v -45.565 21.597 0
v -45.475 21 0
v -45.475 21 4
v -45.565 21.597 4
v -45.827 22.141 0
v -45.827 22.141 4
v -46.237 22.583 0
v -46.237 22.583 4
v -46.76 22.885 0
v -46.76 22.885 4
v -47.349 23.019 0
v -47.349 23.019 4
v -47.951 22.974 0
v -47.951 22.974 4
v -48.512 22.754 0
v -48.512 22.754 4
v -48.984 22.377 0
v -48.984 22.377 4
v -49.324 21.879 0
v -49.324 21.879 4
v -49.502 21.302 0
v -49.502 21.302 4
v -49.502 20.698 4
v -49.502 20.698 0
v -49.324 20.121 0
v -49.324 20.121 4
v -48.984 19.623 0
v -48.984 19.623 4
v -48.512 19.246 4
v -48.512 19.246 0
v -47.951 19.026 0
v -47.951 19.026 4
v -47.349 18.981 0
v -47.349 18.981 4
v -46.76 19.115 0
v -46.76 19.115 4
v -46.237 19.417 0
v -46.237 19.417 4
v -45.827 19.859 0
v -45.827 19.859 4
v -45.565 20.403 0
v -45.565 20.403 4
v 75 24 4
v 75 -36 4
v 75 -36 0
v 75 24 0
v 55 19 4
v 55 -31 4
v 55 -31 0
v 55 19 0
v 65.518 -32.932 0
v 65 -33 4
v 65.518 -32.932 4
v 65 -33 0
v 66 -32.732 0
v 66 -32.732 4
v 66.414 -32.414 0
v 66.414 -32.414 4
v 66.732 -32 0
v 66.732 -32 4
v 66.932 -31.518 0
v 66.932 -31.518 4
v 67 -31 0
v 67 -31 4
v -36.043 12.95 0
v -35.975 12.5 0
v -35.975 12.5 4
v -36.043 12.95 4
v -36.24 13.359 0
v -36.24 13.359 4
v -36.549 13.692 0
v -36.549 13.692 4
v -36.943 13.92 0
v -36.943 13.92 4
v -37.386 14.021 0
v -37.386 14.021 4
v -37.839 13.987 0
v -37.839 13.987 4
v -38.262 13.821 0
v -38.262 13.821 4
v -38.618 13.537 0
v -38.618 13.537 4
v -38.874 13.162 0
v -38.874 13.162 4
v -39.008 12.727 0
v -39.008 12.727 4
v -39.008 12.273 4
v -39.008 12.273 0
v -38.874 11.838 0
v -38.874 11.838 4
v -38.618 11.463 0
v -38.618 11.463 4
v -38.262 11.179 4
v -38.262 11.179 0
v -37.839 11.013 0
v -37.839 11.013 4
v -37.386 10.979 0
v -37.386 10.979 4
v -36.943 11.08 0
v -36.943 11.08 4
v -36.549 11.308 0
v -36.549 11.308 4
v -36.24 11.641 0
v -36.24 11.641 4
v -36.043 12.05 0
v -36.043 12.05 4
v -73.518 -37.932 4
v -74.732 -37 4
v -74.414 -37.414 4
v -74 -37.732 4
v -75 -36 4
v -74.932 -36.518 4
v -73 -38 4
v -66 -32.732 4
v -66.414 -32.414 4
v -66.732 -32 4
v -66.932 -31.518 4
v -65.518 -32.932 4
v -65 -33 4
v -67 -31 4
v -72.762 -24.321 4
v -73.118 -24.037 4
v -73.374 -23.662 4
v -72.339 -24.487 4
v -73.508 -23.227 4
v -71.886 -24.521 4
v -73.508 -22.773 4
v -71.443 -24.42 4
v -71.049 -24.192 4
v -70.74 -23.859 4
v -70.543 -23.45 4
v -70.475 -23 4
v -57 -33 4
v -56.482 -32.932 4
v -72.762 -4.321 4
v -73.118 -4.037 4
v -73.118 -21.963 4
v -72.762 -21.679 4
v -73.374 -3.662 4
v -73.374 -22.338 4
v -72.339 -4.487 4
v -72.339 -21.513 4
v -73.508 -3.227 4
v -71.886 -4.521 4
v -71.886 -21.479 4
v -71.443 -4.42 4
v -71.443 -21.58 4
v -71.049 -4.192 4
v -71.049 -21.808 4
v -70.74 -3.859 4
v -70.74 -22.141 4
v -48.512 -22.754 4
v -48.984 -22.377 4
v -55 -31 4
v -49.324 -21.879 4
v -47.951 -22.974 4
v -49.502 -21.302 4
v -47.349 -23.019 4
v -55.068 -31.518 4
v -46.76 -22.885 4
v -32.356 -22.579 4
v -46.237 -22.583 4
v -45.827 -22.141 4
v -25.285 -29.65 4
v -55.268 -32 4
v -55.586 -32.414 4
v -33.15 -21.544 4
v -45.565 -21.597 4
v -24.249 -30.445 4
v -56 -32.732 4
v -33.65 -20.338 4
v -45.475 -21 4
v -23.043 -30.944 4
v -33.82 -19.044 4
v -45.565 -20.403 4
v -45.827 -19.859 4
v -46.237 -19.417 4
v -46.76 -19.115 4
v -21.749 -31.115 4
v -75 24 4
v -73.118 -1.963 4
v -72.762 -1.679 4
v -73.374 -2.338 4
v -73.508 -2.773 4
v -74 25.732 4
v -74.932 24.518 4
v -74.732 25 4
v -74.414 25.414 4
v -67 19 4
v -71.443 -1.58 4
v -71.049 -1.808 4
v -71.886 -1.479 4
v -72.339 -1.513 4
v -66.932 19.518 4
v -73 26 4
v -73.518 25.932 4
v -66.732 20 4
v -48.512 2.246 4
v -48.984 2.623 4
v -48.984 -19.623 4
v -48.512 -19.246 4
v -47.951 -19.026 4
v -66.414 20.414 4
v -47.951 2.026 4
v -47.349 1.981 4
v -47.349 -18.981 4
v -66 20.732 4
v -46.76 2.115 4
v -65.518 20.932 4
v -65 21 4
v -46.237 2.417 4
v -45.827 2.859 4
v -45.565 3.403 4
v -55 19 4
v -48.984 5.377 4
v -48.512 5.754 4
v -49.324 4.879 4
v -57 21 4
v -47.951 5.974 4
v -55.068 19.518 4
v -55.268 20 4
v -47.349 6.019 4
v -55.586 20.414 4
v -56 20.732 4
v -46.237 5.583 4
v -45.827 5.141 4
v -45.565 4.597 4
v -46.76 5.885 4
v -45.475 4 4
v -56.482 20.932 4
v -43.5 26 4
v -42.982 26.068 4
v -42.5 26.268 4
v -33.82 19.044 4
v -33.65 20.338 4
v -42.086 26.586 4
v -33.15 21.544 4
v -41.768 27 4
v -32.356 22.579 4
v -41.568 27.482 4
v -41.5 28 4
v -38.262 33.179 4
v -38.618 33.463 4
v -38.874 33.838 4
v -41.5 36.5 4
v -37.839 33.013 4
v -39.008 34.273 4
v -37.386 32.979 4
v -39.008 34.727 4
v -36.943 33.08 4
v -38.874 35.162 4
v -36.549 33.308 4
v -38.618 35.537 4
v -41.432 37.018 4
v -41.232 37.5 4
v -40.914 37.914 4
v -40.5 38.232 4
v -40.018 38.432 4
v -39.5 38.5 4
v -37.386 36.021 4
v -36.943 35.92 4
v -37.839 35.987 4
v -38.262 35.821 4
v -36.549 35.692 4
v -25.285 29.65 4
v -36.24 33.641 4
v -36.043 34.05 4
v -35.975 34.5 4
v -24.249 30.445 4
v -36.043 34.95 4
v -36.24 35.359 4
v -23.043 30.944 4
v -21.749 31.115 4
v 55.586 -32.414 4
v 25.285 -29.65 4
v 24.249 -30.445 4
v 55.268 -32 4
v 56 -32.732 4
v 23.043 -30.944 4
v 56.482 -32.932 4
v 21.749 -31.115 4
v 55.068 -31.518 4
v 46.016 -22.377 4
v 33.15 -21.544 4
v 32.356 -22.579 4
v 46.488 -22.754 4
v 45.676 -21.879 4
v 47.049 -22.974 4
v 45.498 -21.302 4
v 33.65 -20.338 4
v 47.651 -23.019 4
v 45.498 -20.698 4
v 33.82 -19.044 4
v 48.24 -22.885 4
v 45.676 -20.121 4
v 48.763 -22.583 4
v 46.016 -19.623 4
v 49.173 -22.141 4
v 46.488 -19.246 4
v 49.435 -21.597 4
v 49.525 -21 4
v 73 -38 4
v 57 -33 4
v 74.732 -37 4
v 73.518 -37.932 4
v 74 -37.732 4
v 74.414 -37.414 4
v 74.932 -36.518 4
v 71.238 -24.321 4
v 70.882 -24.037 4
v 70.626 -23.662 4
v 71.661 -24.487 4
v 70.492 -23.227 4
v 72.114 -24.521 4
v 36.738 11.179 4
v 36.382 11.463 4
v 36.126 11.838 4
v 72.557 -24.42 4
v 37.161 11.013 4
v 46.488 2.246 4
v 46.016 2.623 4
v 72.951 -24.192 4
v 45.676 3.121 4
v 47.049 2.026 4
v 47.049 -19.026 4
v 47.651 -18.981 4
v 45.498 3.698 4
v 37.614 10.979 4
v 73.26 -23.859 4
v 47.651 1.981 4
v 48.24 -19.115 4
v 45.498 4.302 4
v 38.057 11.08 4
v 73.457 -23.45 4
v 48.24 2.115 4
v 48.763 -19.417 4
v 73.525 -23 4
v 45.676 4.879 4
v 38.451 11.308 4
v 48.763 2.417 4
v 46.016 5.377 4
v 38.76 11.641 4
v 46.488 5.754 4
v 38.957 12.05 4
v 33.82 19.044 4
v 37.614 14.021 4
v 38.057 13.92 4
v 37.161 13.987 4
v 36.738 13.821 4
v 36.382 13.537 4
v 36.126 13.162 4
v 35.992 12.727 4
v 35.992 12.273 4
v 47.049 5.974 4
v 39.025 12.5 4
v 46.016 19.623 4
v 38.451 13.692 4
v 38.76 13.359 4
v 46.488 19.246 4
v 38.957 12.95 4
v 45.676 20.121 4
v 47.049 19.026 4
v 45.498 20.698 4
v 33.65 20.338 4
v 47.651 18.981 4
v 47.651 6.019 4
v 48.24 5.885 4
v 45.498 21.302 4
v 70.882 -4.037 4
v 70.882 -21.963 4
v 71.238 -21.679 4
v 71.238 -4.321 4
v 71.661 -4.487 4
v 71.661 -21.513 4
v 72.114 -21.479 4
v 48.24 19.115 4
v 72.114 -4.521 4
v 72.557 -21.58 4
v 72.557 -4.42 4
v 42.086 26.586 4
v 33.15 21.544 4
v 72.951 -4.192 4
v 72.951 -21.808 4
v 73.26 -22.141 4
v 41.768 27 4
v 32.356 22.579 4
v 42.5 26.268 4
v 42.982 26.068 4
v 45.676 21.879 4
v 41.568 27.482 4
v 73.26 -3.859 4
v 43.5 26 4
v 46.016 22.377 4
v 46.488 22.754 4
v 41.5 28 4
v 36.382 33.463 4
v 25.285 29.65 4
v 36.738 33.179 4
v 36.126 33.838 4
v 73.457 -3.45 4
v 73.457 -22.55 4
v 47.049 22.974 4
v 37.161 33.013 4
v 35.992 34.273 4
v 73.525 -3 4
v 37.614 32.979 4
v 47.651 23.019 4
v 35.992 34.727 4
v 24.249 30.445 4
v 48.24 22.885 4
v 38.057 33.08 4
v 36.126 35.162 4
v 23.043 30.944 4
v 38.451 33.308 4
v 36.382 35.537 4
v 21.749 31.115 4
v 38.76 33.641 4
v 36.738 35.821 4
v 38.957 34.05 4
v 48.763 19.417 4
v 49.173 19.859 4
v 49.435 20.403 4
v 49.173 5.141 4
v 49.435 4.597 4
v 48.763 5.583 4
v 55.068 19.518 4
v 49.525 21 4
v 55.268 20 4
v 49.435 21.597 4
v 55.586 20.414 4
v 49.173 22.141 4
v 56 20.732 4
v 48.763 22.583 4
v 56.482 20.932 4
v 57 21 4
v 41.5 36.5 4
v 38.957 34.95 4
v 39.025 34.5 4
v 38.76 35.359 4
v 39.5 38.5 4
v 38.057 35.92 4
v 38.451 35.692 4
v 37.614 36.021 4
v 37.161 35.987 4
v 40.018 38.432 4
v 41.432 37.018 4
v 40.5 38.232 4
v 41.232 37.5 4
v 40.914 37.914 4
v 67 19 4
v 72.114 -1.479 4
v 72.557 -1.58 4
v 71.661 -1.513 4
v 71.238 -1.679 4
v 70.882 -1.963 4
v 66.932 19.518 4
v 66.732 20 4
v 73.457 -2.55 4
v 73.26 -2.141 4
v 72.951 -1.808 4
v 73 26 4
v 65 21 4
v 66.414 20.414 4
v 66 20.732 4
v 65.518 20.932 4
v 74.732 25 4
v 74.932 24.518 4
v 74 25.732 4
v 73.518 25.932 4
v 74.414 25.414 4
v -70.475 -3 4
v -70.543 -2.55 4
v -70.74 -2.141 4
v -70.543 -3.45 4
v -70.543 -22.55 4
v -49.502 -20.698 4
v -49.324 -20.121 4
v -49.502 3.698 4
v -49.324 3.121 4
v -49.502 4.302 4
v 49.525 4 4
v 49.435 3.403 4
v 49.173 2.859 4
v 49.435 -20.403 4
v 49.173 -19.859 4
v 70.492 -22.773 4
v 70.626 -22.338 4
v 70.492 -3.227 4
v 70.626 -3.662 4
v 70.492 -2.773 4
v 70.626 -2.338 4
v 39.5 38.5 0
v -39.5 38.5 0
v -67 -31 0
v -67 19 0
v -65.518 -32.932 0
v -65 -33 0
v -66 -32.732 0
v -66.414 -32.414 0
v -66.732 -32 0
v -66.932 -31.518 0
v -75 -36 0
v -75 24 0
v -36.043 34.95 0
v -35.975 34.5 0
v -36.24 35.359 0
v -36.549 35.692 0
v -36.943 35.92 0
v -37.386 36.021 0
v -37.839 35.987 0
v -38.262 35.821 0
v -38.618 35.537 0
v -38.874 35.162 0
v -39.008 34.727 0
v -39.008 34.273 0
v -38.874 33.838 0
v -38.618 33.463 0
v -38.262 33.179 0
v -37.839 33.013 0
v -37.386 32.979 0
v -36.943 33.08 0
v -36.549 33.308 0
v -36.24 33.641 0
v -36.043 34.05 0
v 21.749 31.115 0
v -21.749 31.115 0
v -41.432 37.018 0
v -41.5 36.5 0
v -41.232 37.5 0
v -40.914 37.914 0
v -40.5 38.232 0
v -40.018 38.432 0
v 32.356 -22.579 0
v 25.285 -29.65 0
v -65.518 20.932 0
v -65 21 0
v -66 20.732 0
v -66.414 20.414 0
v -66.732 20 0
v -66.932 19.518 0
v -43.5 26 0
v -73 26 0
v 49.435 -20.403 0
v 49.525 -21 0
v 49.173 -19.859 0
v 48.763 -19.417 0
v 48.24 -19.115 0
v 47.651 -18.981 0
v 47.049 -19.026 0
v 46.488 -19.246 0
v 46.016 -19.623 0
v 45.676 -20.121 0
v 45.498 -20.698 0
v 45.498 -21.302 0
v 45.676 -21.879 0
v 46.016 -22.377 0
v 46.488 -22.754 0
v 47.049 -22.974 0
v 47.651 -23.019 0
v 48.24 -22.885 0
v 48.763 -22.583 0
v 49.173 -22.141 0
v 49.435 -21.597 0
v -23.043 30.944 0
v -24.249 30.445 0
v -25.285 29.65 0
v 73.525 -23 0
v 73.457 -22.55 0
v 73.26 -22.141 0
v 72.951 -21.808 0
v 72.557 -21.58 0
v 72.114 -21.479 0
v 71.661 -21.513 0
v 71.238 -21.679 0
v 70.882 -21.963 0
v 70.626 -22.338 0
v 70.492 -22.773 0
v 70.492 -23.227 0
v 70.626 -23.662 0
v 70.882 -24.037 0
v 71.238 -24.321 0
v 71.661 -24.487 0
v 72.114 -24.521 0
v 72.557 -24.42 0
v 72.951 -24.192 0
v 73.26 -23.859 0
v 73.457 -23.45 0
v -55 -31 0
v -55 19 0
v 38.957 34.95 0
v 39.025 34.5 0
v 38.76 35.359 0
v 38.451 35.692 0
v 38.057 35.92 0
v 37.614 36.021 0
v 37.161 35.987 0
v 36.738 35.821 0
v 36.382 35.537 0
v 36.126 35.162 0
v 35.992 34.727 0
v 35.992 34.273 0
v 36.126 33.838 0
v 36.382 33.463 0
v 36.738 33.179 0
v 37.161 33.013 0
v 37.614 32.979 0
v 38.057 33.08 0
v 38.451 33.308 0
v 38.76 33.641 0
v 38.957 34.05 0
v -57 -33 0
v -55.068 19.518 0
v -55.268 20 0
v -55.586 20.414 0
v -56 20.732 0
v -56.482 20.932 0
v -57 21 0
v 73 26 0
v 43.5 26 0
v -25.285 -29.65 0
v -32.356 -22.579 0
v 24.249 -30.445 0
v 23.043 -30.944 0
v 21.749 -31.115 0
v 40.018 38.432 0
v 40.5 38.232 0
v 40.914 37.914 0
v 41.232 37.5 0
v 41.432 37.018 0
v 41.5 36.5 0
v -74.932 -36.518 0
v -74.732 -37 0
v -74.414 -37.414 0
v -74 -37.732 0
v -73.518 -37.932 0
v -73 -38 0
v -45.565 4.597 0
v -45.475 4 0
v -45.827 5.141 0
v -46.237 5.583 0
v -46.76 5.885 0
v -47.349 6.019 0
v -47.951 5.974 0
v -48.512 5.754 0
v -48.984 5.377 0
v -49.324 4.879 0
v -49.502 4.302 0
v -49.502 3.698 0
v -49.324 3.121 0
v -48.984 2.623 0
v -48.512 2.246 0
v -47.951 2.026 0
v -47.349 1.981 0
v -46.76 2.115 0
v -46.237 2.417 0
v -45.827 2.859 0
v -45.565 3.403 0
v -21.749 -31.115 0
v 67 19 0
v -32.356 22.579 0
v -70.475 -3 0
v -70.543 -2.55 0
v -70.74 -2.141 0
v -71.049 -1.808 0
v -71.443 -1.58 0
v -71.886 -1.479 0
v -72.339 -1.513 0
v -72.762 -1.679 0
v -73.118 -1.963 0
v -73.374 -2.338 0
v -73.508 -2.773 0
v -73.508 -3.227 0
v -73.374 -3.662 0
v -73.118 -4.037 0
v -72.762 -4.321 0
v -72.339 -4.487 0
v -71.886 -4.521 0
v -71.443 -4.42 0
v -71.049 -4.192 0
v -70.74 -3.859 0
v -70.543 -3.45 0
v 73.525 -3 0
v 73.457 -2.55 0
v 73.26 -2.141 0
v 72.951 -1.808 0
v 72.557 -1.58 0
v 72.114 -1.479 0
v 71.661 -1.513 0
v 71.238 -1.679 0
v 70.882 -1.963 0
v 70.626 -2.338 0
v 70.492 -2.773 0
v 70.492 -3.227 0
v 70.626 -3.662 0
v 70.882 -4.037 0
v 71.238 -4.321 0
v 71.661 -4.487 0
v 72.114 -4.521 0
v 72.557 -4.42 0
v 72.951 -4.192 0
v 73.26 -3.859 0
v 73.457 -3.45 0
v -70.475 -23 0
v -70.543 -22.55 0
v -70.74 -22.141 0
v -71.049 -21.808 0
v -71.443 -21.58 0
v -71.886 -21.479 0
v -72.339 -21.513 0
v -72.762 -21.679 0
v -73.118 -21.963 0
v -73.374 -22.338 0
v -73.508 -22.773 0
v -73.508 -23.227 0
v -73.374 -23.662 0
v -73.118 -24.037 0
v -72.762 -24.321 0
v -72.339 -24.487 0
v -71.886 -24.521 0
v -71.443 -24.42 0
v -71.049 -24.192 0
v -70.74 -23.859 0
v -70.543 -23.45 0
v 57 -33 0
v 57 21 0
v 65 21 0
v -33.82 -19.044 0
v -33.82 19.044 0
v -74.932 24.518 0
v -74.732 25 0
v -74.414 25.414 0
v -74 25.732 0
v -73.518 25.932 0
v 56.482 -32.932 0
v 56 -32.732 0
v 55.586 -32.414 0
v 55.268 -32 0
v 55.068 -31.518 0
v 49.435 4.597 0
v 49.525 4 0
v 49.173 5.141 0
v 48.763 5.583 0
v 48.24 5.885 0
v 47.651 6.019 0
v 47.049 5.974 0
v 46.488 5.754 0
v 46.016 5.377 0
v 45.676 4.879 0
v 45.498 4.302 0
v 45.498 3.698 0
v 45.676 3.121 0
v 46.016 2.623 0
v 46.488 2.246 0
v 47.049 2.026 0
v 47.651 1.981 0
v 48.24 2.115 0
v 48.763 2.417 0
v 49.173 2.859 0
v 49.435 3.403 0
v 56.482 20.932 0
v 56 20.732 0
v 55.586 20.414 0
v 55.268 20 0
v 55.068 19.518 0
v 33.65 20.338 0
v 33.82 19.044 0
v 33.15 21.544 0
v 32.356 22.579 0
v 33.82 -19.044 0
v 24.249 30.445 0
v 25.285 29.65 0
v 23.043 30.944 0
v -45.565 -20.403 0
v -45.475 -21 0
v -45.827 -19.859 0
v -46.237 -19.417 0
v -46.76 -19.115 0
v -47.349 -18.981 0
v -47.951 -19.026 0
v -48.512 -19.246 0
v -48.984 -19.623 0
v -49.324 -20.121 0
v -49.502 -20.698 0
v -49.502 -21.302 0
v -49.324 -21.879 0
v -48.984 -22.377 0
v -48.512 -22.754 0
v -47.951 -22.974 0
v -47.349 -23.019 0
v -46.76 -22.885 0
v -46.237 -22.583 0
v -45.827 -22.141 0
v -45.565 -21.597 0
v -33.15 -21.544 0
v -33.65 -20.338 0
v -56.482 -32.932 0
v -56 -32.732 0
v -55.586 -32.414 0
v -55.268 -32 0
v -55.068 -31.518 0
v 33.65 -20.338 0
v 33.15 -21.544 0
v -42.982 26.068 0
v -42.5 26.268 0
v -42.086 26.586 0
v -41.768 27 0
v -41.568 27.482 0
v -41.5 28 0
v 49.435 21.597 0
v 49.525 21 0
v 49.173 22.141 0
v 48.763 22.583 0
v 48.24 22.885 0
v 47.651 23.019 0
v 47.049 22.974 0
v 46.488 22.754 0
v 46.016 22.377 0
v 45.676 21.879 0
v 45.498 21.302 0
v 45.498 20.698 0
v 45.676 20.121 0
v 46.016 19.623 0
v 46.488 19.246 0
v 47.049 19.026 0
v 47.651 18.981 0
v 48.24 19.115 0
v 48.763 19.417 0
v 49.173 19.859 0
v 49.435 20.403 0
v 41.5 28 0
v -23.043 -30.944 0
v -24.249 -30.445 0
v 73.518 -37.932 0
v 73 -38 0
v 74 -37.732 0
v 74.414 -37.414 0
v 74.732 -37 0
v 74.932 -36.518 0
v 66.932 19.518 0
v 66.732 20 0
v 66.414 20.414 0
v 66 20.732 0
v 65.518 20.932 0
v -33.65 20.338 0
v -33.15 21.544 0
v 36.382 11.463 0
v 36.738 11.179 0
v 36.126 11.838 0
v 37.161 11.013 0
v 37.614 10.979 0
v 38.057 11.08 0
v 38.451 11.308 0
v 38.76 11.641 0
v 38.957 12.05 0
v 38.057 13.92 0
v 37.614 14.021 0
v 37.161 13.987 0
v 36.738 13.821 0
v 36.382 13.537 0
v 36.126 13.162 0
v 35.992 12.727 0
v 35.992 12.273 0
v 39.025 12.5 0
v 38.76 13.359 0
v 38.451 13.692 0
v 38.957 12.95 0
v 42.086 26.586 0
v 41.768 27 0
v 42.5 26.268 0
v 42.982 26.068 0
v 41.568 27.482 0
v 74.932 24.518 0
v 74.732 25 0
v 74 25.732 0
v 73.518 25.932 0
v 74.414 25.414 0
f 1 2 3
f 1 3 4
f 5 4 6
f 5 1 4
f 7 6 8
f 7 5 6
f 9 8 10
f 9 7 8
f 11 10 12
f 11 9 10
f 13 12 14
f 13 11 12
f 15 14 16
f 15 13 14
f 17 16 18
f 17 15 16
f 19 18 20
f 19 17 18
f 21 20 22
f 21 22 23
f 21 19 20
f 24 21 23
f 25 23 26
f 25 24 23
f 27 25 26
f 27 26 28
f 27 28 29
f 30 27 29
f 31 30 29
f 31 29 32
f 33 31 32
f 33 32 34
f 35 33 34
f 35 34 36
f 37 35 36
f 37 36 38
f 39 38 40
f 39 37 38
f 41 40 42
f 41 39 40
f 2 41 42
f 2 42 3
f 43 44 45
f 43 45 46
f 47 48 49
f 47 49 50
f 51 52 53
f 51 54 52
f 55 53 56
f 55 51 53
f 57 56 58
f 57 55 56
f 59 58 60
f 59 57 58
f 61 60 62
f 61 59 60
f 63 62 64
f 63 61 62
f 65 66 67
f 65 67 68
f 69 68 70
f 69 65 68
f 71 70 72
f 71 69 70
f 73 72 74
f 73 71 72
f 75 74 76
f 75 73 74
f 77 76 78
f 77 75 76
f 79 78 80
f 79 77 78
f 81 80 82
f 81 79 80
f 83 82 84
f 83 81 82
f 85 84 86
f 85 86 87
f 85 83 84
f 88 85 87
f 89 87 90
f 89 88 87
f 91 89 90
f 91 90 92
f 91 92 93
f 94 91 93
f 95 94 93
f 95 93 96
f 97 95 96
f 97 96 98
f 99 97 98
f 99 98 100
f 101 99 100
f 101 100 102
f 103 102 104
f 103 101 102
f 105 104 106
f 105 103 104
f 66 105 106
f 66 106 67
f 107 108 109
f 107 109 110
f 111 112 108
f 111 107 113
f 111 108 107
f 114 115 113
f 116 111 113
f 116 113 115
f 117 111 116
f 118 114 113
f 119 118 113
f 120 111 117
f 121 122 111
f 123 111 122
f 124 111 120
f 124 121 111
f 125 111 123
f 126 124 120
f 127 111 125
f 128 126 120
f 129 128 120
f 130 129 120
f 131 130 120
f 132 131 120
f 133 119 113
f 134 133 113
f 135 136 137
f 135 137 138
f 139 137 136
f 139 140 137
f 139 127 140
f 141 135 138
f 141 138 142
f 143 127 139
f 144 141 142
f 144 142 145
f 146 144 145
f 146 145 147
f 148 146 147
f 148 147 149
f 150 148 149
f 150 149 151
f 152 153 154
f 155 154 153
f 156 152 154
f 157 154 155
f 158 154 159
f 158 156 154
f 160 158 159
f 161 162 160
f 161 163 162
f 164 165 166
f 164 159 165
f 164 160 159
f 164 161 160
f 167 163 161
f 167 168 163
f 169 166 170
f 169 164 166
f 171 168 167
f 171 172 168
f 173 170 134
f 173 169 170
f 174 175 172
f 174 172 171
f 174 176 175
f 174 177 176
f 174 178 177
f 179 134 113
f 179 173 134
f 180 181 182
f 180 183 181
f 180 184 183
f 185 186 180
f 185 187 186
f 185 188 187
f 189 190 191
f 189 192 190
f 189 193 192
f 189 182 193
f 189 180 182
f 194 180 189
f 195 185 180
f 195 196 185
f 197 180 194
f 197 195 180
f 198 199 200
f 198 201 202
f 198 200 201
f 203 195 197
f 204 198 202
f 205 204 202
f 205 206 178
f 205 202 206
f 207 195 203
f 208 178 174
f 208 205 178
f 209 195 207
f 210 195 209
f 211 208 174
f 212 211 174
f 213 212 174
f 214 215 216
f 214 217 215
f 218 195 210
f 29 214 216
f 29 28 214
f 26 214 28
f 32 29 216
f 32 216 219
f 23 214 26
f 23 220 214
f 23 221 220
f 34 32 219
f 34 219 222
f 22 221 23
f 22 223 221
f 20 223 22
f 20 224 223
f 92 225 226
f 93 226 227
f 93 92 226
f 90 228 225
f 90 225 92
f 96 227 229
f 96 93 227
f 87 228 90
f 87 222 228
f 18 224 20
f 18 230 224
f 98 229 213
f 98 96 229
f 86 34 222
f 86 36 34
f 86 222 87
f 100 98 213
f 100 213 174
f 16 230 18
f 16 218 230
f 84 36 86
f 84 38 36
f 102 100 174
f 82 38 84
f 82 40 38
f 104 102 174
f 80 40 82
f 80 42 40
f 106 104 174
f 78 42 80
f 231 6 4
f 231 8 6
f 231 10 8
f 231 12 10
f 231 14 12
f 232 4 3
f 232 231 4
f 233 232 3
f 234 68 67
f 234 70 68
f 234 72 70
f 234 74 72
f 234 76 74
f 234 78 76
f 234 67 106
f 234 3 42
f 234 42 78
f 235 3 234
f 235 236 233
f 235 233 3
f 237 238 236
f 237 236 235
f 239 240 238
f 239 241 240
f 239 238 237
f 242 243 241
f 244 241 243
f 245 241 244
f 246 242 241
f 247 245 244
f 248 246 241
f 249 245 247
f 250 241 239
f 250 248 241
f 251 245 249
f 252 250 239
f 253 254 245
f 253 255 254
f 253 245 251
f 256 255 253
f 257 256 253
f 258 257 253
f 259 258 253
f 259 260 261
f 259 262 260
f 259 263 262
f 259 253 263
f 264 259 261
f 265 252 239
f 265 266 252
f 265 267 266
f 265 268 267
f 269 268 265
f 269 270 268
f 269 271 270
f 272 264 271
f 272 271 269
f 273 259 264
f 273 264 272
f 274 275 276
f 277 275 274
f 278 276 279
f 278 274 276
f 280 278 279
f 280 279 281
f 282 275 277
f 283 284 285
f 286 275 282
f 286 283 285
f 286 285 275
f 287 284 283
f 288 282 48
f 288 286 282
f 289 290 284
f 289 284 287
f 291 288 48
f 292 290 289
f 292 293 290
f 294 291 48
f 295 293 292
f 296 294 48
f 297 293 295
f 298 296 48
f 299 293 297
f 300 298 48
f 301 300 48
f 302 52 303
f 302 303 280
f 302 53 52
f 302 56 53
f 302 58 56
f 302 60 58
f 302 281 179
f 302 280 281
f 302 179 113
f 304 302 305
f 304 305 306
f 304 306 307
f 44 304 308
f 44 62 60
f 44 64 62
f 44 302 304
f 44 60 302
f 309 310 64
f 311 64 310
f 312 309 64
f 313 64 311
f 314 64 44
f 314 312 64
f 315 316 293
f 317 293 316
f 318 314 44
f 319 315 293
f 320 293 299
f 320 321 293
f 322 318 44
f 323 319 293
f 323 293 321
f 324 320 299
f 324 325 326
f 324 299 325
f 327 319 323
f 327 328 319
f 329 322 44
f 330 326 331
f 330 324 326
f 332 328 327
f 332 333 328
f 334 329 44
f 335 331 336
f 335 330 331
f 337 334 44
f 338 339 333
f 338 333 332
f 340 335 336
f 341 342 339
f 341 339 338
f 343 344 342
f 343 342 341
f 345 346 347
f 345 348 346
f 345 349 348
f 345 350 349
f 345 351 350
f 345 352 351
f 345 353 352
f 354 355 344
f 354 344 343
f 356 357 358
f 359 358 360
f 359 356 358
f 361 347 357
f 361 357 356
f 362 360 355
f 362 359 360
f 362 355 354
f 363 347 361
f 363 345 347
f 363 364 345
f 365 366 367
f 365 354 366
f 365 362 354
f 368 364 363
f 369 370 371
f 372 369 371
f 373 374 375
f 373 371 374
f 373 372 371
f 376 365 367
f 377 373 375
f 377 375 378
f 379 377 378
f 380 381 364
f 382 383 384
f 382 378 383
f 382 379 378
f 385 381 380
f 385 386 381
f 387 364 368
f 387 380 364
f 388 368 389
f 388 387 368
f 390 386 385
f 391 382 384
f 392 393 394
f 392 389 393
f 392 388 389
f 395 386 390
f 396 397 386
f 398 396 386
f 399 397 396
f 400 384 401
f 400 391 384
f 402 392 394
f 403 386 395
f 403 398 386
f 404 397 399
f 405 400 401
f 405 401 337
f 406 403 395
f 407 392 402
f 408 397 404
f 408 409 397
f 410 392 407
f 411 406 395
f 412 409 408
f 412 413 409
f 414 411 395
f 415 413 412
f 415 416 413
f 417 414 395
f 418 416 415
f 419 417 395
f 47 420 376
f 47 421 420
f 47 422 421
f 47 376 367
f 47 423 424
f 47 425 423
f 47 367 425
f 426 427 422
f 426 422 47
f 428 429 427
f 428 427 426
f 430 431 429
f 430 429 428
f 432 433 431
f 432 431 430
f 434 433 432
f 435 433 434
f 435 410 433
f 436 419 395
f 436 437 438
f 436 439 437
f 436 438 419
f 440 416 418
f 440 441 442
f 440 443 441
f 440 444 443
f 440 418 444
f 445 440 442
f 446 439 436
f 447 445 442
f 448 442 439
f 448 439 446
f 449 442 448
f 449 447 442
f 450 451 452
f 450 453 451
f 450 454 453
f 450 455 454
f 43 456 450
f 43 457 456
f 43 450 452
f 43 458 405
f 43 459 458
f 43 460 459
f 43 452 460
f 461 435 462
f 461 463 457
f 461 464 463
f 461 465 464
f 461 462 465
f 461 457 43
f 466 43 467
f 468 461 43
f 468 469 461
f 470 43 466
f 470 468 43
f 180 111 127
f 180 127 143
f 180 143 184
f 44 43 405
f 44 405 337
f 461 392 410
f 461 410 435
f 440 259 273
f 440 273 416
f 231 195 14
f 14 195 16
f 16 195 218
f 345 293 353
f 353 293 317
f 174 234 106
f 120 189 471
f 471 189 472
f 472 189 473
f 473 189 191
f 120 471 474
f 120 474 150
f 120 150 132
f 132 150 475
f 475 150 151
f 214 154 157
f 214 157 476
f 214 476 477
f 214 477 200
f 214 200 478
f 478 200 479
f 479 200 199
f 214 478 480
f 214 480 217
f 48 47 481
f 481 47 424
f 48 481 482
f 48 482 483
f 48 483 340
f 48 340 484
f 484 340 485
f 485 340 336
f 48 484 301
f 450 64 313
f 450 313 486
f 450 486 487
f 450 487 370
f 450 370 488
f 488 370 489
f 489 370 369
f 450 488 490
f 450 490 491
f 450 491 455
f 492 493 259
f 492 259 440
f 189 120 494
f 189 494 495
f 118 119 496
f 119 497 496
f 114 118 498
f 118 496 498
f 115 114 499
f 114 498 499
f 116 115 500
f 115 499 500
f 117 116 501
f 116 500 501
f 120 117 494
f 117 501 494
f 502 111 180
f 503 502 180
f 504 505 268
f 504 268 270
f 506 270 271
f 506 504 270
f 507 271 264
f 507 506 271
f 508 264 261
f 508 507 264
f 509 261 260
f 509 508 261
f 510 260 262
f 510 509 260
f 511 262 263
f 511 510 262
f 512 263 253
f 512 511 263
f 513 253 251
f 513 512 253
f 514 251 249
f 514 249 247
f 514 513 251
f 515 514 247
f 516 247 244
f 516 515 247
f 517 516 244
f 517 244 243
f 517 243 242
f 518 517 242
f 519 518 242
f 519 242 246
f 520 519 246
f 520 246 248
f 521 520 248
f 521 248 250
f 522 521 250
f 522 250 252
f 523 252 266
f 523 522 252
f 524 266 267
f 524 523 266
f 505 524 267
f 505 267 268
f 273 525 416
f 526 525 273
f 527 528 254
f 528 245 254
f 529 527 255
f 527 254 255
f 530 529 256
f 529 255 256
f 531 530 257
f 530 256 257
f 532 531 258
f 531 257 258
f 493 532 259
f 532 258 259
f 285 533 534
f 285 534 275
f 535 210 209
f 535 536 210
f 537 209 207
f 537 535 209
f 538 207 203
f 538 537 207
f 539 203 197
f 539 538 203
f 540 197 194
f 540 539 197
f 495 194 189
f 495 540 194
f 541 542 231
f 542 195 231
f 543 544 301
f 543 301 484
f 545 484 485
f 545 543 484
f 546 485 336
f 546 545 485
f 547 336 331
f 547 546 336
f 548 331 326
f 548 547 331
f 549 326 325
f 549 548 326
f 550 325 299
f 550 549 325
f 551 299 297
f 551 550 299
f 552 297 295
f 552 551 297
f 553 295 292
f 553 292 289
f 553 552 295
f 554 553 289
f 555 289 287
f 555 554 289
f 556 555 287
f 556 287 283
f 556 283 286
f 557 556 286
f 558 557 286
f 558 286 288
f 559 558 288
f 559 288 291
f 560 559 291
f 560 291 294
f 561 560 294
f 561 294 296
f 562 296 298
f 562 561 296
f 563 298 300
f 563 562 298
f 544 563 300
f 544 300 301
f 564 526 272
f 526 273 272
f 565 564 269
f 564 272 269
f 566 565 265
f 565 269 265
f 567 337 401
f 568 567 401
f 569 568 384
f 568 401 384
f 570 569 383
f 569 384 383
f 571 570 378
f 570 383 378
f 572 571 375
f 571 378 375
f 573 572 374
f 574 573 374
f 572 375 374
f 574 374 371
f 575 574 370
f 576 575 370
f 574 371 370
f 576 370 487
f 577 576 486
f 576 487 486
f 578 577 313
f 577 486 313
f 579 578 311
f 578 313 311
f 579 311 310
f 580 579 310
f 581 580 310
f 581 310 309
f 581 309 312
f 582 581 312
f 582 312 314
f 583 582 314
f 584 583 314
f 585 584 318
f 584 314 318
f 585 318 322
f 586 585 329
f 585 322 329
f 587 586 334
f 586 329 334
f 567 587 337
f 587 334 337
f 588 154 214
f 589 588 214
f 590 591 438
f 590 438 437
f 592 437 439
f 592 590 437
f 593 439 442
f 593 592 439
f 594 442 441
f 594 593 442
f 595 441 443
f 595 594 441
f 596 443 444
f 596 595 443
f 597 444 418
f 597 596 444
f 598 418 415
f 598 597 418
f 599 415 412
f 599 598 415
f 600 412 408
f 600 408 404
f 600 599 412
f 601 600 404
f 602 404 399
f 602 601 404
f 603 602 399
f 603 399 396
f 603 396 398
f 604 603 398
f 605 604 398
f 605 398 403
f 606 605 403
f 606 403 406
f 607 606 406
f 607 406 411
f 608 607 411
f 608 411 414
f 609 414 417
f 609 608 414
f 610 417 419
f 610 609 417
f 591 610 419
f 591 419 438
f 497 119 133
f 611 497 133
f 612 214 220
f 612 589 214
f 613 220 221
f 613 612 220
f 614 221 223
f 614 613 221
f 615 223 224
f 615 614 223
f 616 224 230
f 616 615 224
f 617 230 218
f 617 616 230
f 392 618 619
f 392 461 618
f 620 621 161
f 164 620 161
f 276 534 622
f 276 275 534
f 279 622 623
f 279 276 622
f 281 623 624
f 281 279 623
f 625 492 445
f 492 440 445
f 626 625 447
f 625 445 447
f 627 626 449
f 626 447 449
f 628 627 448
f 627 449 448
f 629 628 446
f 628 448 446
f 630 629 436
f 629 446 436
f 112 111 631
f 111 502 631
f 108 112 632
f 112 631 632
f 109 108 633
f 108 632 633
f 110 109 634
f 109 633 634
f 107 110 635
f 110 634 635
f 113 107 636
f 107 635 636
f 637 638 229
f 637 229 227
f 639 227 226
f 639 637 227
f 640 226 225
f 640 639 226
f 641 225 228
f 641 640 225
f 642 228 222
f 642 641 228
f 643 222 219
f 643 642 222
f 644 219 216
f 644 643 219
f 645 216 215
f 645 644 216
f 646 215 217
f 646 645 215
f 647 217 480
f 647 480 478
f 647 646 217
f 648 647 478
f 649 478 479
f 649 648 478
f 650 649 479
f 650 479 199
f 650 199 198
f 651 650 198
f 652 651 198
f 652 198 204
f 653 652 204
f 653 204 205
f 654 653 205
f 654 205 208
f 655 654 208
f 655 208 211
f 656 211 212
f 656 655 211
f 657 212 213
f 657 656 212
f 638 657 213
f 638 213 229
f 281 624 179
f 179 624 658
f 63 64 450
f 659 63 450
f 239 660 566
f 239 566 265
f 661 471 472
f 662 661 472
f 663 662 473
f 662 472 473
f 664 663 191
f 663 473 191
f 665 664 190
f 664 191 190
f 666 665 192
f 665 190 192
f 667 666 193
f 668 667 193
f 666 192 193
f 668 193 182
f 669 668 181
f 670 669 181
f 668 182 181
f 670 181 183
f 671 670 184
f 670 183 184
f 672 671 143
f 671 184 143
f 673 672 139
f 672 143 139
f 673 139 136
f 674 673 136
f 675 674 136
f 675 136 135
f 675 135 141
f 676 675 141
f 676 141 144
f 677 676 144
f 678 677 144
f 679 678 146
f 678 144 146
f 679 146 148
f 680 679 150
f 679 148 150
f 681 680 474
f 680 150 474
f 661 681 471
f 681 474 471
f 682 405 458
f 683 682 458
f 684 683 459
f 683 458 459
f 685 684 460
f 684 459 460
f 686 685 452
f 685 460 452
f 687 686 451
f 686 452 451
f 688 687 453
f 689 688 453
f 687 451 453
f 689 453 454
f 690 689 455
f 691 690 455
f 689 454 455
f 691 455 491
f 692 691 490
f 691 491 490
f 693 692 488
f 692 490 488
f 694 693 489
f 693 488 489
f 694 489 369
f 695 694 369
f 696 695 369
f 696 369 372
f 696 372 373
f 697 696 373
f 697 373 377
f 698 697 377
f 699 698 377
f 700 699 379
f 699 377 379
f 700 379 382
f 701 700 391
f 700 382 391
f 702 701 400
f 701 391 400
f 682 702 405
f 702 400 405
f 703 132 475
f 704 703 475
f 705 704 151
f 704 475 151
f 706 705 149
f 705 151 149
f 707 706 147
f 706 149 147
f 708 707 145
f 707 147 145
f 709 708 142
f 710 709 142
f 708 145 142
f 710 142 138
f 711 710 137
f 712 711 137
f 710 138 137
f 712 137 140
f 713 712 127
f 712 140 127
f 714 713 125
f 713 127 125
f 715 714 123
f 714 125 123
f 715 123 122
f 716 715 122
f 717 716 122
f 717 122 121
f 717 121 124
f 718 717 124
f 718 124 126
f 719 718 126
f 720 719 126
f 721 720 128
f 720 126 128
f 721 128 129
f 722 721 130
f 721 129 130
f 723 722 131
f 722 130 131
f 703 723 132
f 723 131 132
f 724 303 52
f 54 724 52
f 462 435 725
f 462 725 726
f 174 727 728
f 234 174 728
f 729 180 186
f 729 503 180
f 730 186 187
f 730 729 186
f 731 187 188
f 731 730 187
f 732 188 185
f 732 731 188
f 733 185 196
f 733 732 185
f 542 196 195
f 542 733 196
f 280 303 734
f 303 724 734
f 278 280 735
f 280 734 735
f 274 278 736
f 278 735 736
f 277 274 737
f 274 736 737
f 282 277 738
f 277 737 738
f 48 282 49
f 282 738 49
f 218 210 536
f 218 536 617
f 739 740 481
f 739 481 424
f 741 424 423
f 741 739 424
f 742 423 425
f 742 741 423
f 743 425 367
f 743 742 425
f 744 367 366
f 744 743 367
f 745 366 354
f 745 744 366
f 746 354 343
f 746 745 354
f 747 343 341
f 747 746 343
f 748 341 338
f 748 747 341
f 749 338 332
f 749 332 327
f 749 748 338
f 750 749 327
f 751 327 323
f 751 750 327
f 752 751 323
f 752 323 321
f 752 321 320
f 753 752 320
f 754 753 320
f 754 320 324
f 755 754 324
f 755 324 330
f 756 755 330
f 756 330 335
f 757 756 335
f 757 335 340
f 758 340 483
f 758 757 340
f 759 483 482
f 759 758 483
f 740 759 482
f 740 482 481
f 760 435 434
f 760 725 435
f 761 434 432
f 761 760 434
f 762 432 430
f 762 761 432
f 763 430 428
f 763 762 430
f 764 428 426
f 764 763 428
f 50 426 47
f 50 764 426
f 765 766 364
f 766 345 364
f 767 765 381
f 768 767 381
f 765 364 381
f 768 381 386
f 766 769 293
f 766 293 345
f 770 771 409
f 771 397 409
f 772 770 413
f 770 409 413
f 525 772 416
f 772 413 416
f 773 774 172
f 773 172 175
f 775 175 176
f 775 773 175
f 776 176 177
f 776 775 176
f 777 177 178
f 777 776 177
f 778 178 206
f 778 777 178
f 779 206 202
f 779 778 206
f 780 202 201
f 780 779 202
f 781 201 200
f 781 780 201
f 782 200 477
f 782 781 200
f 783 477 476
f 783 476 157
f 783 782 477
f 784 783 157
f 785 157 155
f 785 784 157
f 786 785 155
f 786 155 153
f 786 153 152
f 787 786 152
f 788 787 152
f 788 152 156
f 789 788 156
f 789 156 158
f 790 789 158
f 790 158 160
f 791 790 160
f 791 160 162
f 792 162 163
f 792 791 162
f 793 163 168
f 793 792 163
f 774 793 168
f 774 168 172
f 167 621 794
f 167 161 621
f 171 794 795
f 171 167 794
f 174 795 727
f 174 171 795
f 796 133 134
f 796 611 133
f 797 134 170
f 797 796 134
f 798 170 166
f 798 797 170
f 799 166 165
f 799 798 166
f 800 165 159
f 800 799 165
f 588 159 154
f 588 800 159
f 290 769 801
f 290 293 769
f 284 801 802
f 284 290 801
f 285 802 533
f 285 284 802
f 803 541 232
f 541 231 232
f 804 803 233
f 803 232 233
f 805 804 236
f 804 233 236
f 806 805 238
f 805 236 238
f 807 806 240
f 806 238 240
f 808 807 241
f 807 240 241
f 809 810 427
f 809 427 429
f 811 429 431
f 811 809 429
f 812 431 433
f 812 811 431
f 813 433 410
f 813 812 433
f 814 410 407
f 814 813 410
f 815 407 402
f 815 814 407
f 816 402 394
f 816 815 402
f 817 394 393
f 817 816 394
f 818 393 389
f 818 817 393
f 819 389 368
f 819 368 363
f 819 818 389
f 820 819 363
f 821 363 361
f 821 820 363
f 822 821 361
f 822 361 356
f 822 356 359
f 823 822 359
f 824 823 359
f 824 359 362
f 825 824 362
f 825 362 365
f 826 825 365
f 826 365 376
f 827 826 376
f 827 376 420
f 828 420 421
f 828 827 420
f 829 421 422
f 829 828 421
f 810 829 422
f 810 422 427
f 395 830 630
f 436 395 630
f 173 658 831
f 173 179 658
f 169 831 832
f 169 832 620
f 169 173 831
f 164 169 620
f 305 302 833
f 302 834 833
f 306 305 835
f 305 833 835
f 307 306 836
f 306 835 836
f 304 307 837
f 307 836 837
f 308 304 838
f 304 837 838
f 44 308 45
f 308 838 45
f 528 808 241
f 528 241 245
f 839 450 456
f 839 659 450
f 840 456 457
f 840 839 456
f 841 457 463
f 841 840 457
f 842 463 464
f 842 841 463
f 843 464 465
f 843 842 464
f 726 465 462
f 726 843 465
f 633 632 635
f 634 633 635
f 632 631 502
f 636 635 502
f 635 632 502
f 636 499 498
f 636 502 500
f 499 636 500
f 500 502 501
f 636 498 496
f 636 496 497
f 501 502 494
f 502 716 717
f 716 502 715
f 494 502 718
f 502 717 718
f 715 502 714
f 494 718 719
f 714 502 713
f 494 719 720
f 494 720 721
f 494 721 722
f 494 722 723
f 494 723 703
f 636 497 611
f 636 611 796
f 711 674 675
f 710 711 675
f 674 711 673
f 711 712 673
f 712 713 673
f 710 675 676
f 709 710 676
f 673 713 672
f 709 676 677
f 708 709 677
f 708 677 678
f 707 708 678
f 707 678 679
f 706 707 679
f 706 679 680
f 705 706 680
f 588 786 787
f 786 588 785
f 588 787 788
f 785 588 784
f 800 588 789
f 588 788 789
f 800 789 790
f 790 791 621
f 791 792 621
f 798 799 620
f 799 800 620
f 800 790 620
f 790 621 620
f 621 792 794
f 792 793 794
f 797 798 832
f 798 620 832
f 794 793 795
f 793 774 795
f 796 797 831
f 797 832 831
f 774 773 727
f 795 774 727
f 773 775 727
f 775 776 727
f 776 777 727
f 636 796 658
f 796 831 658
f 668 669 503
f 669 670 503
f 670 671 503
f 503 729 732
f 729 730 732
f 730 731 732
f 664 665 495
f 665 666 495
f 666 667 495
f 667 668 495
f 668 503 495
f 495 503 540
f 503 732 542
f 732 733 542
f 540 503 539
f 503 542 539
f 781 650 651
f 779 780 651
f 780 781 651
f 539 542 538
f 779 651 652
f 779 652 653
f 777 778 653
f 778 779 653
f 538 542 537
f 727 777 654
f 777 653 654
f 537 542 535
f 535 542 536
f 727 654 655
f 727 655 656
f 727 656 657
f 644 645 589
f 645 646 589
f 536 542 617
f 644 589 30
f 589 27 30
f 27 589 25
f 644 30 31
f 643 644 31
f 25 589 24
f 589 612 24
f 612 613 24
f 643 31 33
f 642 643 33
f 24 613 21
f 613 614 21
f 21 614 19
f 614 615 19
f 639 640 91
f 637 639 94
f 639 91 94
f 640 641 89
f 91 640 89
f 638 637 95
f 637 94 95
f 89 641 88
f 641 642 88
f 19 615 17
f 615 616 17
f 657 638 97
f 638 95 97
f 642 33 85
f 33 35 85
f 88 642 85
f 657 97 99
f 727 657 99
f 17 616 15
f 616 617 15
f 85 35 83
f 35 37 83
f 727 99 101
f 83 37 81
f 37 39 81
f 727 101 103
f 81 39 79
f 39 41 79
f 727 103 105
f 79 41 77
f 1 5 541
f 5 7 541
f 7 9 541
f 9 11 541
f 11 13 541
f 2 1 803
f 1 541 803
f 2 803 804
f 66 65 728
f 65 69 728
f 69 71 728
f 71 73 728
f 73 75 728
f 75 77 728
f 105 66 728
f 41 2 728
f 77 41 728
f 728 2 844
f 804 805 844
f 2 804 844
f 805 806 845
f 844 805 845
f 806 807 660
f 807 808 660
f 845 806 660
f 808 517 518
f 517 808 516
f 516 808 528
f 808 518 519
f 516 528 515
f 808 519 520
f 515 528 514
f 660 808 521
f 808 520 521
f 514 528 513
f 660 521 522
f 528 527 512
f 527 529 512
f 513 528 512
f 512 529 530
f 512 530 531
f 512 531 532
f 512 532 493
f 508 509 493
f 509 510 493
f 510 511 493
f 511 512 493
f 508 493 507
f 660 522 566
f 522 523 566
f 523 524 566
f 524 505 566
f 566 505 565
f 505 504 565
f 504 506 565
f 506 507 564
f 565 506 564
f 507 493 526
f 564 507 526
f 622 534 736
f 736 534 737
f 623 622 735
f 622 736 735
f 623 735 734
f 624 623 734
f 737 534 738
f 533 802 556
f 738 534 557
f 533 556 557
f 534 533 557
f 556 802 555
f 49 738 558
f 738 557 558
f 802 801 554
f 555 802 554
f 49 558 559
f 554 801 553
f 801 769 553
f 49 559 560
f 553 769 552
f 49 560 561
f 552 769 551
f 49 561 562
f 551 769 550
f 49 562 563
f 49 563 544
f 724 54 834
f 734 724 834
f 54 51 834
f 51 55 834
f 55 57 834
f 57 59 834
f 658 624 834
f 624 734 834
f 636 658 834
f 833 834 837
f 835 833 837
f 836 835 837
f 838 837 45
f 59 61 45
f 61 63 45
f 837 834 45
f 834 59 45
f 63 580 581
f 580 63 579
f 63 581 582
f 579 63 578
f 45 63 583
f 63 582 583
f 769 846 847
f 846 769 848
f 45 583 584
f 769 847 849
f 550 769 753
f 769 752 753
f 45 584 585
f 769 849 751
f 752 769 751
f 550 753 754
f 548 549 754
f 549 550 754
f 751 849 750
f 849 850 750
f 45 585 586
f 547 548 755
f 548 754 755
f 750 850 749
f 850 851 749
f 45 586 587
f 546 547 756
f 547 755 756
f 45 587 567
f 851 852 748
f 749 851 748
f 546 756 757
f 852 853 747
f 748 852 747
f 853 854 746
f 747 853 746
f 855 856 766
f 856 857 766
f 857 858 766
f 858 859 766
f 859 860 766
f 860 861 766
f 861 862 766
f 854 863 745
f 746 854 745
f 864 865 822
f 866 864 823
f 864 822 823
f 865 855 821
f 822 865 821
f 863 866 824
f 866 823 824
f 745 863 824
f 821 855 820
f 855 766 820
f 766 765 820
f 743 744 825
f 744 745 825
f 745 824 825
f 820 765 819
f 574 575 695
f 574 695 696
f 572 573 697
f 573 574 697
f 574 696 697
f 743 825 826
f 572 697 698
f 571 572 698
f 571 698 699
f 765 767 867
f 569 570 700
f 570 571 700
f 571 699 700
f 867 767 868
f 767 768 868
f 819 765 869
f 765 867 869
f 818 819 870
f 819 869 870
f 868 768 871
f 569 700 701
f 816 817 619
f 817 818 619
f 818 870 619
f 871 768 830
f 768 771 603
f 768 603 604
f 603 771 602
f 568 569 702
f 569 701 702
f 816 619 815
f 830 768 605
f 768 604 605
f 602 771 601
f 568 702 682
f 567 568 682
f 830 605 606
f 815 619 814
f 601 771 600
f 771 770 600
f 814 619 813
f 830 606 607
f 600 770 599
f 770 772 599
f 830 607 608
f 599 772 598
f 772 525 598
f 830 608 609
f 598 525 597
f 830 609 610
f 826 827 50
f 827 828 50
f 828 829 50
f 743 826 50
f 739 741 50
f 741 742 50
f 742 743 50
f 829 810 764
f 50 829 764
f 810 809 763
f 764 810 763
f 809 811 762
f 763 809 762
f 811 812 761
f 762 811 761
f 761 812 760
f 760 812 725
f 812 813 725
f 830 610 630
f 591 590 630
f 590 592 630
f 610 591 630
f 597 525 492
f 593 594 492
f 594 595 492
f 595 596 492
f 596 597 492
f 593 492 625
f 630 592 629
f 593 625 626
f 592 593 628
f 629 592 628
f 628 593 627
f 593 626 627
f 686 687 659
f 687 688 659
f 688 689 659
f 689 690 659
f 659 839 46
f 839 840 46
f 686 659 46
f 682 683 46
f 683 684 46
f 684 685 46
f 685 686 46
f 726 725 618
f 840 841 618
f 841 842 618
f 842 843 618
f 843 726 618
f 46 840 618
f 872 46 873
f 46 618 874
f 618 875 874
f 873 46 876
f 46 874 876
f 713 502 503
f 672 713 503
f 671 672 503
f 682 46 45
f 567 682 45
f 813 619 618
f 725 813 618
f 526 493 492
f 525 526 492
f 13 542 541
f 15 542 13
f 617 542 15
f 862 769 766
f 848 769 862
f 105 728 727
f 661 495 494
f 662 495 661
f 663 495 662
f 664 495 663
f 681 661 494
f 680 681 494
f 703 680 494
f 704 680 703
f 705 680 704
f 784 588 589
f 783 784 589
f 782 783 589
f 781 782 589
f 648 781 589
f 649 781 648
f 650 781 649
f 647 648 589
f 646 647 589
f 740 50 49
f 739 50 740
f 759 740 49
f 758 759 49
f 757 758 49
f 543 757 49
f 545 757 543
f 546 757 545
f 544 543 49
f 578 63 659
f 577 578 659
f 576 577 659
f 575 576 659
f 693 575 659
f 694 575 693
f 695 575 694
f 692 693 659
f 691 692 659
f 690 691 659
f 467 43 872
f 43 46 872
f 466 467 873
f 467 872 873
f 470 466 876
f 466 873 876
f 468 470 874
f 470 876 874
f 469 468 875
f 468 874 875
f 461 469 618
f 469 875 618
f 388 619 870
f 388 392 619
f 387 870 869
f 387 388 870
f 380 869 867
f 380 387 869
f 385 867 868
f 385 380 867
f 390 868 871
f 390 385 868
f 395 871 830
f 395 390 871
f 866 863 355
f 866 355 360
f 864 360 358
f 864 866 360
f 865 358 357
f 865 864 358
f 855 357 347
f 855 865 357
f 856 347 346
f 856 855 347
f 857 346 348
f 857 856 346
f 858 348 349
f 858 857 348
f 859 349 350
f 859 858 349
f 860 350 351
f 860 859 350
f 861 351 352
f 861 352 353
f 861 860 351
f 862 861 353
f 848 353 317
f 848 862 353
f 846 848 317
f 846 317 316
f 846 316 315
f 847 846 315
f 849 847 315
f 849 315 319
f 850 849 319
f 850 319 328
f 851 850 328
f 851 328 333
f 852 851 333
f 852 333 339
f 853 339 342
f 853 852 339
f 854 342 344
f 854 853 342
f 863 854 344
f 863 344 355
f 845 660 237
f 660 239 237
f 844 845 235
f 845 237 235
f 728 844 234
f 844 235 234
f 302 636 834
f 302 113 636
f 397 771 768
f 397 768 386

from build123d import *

# Parameters (mm, degrees)
SKETCH_1_W          = 105
SKETCH_1_H          = 52
SKETCH_1_R          = 2.025
SKETCH_1_R_2        = 1.525
SKETCH_1_W_2        = 83
SKETCH_1_H_2        = 12.5
EXTRUDE_3_DEPTH     = 4
SKETCH_3_W          = 105
SKETCH_3_H          = 12
EXTRUDE_4_DEPTH     = 4
SKETCH_6_W          = 67.640689882
SKETCH_6_H          = 62.229434692
CUT_EXTRUDE_1_DEPTH = 4
CHAMFER_1_SIZE      = 10
FILLET_2_R          = 5
SKETCH_7_W          = 20
SKETCH_7_H          = 64
SKETCH_7_R          = 1.525
EXTRUDE_5_DEPTH     = 4
SKETCH_8_W          = 12
SKETCH_8_H          = 54
CUT_EXTRUDE_2_DEPTH = 10
FILLET_3_R          = 2


with BuildPart() as part:
    # 草图1 → 凸台-拉伸3 (new body)
    with BuildSketch(Plane.XY):
        Rectangle(SKETCH_1_W, SKETCH_1_H)
        with Locations((-47.5, 4)):
            Circle(SKETCH_1_R, mode=Mode.SUBTRACT)
        with Locations((-47.5, 21)):
            Circle(SKETCH_1_R, mode=Mode.SUBTRACT)
        with Locations((-47.5, -21)):
            Circle(SKETCH_1_R, mode=Mode.SUBTRACT)
        with Locations((47.5, 21)):
            Circle(SKETCH_1_R, mode=Mode.SUBTRACT)
        with Locations((47.5, 4)):
            Circle(SKETCH_1_R, mode=Mode.SUBTRACT)
        with Locations((47.5, -21)):
            Circle(SKETCH_1_R, mode=Mode.SUBTRACT)
        with Locations((-37.5, 12.5)):
            Circle(SKETCH_1_R_2, mode=Mode.SUBTRACT)
        with Locations((37.5, 12.5)):
            Circle(SKETCH_1_R_2, mode=Mode.SUBTRACT)
        with Locations((0, 32.25)):
            Rectangle(SKETCH_1_W_2, SKETCH_1_H_2)
        with Locations((-37.5, 34.5)):
            Circle(SKETCH_1_R_2, mode=Mode.SUBTRACT)
        with Locations((37.5, 34.5)):
            Circle(SKETCH_1_R_2, mode=Mode.SUBTRACT)
    extrude(amount=EXTRUDE_3_DEPTH)

    # 草图3 → 凸台-拉伸4 (add)
    with BuildSketch(Plane.XY.offset(4)):
        with Locations((0, -32)):
            Rectangle(SKETCH_3_W, SKETCH_3_H)
        Polygon((-52.5, -26), (-52.5, 26), (-55, 26), (-55, -38), (-52.5, -38), align=None)
        Polygon((52.5, -38), (55, -38), (55, 26), (52.5, 26), (52.5, -26), align=None)
    extrude(amount=-EXTRUDE_4_DEPTH)

    # 草图6 → 切除-拉伸1 (cut)
    with BuildSketch(Plane(origin=(0, 0, 0), x_dir=(-1, 0, 0), z_dir=(0, 0, -1))):
        Rectangle(SKETCH_6_W, SKETCH_6_H)
    extrude(amount=-CUT_EXTRUDE_1_DEPTH, mode=Mode.SUBTRACT)

    # 倒角1
    chamfer_1_edges = [part.edges().sort_by_distance(p)[0] for p in [
        (-33.820344941, -31.114717346, 2),
        (33.820344941, -31.114717346, 2),
        (33.820344941, 31.114717346, 2),
        (-33.820344941, 31.114717346, 2),
    ]]
    chamfer(chamfer_1_edges, length=CHAMFER_1_SIZE)

    # 圆角2
    fillet_2_edges = [part.edges().sort_by_distance(p)[0] for p in [
        (-33.820344941, 21.114717346, 2),
        (-33.820344941, -21.114717346, 2),
        (23.820344941, -31.114717346, 2),
        (-23.820344941, -31.114717346, 2),
        (23.820344941, 31.114717346, 2),
        (-23.820344941, 31.114717346, 2),
        (33.820344941, -21.114717346, 2),
        (33.820344941, 21.114717346, 2),
    ]]
    fillet(fillet_2_edges, radius=FILLET_2_R)

    # 草图7 → 凸台-拉伸5 (add)
    with BuildSketch(Plane.XY.offset(4)):
        with Locations((-65, -6)):
            Rectangle(SKETCH_7_W, SKETCH_7_H)
        with Locations((-72, -3)):
            Circle(SKETCH_7_R, mode=Mode.SUBTRACT)
        with Locations((-72, -23)):
            Circle(SKETCH_7_R, mode=Mode.SUBTRACT)
        with Locations((65, -6)):
            Rectangle(SKETCH_7_W, SKETCH_7_H)
        with Locations((72, -23)):
            Circle(SKETCH_7_R, mode=Mode.SUBTRACT)
        with Locations((72, -3)):
            Circle(SKETCH_7_R, mode=Mode.SUBTRACT)
    extrude(amount=-EXTRUDE_5_DEPTH)

    # 草图8 → 切除-拉伸2 (cut)
    with BuildSketch(Plane.XY.offset(4)):
        with Locations((-61, -6)):
            Rectangle(SKETCH_8_W, SKETCH_8_H)
        with Locations((61, -6)):
            Rectangle(SKETCH_8_W, SKETCH_8_H)
    extrude(amount=-CUT_EXTRUDE_2_DEPTH, mode=Mode.SUBTRACT)

    # 圆角3
    fillet_3_edges = [part.edges().sort_by_distance(p)[0] for p in [
        (-75, 26, 2),
        (-75, -38, 2),
        (75, -38, 2),
        (75, 26, 2),
        (-67, -33, 2),
        (-67, 21, 2),
        (-55, 21, 2),
        (-55, -33, 2),
        (67, 21, 2),
        (67, -33, 2),
        (55, -33, 2),
        (55, 21, 2),
        (-41.5, 38.5, 2),
        (41.5, 38.5, 2),
        (41.5, 26, 2),
        (-41.5, 26, 2),
    ]]
    fillet(fillet_3_edges, radius=FILLET_3_R)


solid = part.part
